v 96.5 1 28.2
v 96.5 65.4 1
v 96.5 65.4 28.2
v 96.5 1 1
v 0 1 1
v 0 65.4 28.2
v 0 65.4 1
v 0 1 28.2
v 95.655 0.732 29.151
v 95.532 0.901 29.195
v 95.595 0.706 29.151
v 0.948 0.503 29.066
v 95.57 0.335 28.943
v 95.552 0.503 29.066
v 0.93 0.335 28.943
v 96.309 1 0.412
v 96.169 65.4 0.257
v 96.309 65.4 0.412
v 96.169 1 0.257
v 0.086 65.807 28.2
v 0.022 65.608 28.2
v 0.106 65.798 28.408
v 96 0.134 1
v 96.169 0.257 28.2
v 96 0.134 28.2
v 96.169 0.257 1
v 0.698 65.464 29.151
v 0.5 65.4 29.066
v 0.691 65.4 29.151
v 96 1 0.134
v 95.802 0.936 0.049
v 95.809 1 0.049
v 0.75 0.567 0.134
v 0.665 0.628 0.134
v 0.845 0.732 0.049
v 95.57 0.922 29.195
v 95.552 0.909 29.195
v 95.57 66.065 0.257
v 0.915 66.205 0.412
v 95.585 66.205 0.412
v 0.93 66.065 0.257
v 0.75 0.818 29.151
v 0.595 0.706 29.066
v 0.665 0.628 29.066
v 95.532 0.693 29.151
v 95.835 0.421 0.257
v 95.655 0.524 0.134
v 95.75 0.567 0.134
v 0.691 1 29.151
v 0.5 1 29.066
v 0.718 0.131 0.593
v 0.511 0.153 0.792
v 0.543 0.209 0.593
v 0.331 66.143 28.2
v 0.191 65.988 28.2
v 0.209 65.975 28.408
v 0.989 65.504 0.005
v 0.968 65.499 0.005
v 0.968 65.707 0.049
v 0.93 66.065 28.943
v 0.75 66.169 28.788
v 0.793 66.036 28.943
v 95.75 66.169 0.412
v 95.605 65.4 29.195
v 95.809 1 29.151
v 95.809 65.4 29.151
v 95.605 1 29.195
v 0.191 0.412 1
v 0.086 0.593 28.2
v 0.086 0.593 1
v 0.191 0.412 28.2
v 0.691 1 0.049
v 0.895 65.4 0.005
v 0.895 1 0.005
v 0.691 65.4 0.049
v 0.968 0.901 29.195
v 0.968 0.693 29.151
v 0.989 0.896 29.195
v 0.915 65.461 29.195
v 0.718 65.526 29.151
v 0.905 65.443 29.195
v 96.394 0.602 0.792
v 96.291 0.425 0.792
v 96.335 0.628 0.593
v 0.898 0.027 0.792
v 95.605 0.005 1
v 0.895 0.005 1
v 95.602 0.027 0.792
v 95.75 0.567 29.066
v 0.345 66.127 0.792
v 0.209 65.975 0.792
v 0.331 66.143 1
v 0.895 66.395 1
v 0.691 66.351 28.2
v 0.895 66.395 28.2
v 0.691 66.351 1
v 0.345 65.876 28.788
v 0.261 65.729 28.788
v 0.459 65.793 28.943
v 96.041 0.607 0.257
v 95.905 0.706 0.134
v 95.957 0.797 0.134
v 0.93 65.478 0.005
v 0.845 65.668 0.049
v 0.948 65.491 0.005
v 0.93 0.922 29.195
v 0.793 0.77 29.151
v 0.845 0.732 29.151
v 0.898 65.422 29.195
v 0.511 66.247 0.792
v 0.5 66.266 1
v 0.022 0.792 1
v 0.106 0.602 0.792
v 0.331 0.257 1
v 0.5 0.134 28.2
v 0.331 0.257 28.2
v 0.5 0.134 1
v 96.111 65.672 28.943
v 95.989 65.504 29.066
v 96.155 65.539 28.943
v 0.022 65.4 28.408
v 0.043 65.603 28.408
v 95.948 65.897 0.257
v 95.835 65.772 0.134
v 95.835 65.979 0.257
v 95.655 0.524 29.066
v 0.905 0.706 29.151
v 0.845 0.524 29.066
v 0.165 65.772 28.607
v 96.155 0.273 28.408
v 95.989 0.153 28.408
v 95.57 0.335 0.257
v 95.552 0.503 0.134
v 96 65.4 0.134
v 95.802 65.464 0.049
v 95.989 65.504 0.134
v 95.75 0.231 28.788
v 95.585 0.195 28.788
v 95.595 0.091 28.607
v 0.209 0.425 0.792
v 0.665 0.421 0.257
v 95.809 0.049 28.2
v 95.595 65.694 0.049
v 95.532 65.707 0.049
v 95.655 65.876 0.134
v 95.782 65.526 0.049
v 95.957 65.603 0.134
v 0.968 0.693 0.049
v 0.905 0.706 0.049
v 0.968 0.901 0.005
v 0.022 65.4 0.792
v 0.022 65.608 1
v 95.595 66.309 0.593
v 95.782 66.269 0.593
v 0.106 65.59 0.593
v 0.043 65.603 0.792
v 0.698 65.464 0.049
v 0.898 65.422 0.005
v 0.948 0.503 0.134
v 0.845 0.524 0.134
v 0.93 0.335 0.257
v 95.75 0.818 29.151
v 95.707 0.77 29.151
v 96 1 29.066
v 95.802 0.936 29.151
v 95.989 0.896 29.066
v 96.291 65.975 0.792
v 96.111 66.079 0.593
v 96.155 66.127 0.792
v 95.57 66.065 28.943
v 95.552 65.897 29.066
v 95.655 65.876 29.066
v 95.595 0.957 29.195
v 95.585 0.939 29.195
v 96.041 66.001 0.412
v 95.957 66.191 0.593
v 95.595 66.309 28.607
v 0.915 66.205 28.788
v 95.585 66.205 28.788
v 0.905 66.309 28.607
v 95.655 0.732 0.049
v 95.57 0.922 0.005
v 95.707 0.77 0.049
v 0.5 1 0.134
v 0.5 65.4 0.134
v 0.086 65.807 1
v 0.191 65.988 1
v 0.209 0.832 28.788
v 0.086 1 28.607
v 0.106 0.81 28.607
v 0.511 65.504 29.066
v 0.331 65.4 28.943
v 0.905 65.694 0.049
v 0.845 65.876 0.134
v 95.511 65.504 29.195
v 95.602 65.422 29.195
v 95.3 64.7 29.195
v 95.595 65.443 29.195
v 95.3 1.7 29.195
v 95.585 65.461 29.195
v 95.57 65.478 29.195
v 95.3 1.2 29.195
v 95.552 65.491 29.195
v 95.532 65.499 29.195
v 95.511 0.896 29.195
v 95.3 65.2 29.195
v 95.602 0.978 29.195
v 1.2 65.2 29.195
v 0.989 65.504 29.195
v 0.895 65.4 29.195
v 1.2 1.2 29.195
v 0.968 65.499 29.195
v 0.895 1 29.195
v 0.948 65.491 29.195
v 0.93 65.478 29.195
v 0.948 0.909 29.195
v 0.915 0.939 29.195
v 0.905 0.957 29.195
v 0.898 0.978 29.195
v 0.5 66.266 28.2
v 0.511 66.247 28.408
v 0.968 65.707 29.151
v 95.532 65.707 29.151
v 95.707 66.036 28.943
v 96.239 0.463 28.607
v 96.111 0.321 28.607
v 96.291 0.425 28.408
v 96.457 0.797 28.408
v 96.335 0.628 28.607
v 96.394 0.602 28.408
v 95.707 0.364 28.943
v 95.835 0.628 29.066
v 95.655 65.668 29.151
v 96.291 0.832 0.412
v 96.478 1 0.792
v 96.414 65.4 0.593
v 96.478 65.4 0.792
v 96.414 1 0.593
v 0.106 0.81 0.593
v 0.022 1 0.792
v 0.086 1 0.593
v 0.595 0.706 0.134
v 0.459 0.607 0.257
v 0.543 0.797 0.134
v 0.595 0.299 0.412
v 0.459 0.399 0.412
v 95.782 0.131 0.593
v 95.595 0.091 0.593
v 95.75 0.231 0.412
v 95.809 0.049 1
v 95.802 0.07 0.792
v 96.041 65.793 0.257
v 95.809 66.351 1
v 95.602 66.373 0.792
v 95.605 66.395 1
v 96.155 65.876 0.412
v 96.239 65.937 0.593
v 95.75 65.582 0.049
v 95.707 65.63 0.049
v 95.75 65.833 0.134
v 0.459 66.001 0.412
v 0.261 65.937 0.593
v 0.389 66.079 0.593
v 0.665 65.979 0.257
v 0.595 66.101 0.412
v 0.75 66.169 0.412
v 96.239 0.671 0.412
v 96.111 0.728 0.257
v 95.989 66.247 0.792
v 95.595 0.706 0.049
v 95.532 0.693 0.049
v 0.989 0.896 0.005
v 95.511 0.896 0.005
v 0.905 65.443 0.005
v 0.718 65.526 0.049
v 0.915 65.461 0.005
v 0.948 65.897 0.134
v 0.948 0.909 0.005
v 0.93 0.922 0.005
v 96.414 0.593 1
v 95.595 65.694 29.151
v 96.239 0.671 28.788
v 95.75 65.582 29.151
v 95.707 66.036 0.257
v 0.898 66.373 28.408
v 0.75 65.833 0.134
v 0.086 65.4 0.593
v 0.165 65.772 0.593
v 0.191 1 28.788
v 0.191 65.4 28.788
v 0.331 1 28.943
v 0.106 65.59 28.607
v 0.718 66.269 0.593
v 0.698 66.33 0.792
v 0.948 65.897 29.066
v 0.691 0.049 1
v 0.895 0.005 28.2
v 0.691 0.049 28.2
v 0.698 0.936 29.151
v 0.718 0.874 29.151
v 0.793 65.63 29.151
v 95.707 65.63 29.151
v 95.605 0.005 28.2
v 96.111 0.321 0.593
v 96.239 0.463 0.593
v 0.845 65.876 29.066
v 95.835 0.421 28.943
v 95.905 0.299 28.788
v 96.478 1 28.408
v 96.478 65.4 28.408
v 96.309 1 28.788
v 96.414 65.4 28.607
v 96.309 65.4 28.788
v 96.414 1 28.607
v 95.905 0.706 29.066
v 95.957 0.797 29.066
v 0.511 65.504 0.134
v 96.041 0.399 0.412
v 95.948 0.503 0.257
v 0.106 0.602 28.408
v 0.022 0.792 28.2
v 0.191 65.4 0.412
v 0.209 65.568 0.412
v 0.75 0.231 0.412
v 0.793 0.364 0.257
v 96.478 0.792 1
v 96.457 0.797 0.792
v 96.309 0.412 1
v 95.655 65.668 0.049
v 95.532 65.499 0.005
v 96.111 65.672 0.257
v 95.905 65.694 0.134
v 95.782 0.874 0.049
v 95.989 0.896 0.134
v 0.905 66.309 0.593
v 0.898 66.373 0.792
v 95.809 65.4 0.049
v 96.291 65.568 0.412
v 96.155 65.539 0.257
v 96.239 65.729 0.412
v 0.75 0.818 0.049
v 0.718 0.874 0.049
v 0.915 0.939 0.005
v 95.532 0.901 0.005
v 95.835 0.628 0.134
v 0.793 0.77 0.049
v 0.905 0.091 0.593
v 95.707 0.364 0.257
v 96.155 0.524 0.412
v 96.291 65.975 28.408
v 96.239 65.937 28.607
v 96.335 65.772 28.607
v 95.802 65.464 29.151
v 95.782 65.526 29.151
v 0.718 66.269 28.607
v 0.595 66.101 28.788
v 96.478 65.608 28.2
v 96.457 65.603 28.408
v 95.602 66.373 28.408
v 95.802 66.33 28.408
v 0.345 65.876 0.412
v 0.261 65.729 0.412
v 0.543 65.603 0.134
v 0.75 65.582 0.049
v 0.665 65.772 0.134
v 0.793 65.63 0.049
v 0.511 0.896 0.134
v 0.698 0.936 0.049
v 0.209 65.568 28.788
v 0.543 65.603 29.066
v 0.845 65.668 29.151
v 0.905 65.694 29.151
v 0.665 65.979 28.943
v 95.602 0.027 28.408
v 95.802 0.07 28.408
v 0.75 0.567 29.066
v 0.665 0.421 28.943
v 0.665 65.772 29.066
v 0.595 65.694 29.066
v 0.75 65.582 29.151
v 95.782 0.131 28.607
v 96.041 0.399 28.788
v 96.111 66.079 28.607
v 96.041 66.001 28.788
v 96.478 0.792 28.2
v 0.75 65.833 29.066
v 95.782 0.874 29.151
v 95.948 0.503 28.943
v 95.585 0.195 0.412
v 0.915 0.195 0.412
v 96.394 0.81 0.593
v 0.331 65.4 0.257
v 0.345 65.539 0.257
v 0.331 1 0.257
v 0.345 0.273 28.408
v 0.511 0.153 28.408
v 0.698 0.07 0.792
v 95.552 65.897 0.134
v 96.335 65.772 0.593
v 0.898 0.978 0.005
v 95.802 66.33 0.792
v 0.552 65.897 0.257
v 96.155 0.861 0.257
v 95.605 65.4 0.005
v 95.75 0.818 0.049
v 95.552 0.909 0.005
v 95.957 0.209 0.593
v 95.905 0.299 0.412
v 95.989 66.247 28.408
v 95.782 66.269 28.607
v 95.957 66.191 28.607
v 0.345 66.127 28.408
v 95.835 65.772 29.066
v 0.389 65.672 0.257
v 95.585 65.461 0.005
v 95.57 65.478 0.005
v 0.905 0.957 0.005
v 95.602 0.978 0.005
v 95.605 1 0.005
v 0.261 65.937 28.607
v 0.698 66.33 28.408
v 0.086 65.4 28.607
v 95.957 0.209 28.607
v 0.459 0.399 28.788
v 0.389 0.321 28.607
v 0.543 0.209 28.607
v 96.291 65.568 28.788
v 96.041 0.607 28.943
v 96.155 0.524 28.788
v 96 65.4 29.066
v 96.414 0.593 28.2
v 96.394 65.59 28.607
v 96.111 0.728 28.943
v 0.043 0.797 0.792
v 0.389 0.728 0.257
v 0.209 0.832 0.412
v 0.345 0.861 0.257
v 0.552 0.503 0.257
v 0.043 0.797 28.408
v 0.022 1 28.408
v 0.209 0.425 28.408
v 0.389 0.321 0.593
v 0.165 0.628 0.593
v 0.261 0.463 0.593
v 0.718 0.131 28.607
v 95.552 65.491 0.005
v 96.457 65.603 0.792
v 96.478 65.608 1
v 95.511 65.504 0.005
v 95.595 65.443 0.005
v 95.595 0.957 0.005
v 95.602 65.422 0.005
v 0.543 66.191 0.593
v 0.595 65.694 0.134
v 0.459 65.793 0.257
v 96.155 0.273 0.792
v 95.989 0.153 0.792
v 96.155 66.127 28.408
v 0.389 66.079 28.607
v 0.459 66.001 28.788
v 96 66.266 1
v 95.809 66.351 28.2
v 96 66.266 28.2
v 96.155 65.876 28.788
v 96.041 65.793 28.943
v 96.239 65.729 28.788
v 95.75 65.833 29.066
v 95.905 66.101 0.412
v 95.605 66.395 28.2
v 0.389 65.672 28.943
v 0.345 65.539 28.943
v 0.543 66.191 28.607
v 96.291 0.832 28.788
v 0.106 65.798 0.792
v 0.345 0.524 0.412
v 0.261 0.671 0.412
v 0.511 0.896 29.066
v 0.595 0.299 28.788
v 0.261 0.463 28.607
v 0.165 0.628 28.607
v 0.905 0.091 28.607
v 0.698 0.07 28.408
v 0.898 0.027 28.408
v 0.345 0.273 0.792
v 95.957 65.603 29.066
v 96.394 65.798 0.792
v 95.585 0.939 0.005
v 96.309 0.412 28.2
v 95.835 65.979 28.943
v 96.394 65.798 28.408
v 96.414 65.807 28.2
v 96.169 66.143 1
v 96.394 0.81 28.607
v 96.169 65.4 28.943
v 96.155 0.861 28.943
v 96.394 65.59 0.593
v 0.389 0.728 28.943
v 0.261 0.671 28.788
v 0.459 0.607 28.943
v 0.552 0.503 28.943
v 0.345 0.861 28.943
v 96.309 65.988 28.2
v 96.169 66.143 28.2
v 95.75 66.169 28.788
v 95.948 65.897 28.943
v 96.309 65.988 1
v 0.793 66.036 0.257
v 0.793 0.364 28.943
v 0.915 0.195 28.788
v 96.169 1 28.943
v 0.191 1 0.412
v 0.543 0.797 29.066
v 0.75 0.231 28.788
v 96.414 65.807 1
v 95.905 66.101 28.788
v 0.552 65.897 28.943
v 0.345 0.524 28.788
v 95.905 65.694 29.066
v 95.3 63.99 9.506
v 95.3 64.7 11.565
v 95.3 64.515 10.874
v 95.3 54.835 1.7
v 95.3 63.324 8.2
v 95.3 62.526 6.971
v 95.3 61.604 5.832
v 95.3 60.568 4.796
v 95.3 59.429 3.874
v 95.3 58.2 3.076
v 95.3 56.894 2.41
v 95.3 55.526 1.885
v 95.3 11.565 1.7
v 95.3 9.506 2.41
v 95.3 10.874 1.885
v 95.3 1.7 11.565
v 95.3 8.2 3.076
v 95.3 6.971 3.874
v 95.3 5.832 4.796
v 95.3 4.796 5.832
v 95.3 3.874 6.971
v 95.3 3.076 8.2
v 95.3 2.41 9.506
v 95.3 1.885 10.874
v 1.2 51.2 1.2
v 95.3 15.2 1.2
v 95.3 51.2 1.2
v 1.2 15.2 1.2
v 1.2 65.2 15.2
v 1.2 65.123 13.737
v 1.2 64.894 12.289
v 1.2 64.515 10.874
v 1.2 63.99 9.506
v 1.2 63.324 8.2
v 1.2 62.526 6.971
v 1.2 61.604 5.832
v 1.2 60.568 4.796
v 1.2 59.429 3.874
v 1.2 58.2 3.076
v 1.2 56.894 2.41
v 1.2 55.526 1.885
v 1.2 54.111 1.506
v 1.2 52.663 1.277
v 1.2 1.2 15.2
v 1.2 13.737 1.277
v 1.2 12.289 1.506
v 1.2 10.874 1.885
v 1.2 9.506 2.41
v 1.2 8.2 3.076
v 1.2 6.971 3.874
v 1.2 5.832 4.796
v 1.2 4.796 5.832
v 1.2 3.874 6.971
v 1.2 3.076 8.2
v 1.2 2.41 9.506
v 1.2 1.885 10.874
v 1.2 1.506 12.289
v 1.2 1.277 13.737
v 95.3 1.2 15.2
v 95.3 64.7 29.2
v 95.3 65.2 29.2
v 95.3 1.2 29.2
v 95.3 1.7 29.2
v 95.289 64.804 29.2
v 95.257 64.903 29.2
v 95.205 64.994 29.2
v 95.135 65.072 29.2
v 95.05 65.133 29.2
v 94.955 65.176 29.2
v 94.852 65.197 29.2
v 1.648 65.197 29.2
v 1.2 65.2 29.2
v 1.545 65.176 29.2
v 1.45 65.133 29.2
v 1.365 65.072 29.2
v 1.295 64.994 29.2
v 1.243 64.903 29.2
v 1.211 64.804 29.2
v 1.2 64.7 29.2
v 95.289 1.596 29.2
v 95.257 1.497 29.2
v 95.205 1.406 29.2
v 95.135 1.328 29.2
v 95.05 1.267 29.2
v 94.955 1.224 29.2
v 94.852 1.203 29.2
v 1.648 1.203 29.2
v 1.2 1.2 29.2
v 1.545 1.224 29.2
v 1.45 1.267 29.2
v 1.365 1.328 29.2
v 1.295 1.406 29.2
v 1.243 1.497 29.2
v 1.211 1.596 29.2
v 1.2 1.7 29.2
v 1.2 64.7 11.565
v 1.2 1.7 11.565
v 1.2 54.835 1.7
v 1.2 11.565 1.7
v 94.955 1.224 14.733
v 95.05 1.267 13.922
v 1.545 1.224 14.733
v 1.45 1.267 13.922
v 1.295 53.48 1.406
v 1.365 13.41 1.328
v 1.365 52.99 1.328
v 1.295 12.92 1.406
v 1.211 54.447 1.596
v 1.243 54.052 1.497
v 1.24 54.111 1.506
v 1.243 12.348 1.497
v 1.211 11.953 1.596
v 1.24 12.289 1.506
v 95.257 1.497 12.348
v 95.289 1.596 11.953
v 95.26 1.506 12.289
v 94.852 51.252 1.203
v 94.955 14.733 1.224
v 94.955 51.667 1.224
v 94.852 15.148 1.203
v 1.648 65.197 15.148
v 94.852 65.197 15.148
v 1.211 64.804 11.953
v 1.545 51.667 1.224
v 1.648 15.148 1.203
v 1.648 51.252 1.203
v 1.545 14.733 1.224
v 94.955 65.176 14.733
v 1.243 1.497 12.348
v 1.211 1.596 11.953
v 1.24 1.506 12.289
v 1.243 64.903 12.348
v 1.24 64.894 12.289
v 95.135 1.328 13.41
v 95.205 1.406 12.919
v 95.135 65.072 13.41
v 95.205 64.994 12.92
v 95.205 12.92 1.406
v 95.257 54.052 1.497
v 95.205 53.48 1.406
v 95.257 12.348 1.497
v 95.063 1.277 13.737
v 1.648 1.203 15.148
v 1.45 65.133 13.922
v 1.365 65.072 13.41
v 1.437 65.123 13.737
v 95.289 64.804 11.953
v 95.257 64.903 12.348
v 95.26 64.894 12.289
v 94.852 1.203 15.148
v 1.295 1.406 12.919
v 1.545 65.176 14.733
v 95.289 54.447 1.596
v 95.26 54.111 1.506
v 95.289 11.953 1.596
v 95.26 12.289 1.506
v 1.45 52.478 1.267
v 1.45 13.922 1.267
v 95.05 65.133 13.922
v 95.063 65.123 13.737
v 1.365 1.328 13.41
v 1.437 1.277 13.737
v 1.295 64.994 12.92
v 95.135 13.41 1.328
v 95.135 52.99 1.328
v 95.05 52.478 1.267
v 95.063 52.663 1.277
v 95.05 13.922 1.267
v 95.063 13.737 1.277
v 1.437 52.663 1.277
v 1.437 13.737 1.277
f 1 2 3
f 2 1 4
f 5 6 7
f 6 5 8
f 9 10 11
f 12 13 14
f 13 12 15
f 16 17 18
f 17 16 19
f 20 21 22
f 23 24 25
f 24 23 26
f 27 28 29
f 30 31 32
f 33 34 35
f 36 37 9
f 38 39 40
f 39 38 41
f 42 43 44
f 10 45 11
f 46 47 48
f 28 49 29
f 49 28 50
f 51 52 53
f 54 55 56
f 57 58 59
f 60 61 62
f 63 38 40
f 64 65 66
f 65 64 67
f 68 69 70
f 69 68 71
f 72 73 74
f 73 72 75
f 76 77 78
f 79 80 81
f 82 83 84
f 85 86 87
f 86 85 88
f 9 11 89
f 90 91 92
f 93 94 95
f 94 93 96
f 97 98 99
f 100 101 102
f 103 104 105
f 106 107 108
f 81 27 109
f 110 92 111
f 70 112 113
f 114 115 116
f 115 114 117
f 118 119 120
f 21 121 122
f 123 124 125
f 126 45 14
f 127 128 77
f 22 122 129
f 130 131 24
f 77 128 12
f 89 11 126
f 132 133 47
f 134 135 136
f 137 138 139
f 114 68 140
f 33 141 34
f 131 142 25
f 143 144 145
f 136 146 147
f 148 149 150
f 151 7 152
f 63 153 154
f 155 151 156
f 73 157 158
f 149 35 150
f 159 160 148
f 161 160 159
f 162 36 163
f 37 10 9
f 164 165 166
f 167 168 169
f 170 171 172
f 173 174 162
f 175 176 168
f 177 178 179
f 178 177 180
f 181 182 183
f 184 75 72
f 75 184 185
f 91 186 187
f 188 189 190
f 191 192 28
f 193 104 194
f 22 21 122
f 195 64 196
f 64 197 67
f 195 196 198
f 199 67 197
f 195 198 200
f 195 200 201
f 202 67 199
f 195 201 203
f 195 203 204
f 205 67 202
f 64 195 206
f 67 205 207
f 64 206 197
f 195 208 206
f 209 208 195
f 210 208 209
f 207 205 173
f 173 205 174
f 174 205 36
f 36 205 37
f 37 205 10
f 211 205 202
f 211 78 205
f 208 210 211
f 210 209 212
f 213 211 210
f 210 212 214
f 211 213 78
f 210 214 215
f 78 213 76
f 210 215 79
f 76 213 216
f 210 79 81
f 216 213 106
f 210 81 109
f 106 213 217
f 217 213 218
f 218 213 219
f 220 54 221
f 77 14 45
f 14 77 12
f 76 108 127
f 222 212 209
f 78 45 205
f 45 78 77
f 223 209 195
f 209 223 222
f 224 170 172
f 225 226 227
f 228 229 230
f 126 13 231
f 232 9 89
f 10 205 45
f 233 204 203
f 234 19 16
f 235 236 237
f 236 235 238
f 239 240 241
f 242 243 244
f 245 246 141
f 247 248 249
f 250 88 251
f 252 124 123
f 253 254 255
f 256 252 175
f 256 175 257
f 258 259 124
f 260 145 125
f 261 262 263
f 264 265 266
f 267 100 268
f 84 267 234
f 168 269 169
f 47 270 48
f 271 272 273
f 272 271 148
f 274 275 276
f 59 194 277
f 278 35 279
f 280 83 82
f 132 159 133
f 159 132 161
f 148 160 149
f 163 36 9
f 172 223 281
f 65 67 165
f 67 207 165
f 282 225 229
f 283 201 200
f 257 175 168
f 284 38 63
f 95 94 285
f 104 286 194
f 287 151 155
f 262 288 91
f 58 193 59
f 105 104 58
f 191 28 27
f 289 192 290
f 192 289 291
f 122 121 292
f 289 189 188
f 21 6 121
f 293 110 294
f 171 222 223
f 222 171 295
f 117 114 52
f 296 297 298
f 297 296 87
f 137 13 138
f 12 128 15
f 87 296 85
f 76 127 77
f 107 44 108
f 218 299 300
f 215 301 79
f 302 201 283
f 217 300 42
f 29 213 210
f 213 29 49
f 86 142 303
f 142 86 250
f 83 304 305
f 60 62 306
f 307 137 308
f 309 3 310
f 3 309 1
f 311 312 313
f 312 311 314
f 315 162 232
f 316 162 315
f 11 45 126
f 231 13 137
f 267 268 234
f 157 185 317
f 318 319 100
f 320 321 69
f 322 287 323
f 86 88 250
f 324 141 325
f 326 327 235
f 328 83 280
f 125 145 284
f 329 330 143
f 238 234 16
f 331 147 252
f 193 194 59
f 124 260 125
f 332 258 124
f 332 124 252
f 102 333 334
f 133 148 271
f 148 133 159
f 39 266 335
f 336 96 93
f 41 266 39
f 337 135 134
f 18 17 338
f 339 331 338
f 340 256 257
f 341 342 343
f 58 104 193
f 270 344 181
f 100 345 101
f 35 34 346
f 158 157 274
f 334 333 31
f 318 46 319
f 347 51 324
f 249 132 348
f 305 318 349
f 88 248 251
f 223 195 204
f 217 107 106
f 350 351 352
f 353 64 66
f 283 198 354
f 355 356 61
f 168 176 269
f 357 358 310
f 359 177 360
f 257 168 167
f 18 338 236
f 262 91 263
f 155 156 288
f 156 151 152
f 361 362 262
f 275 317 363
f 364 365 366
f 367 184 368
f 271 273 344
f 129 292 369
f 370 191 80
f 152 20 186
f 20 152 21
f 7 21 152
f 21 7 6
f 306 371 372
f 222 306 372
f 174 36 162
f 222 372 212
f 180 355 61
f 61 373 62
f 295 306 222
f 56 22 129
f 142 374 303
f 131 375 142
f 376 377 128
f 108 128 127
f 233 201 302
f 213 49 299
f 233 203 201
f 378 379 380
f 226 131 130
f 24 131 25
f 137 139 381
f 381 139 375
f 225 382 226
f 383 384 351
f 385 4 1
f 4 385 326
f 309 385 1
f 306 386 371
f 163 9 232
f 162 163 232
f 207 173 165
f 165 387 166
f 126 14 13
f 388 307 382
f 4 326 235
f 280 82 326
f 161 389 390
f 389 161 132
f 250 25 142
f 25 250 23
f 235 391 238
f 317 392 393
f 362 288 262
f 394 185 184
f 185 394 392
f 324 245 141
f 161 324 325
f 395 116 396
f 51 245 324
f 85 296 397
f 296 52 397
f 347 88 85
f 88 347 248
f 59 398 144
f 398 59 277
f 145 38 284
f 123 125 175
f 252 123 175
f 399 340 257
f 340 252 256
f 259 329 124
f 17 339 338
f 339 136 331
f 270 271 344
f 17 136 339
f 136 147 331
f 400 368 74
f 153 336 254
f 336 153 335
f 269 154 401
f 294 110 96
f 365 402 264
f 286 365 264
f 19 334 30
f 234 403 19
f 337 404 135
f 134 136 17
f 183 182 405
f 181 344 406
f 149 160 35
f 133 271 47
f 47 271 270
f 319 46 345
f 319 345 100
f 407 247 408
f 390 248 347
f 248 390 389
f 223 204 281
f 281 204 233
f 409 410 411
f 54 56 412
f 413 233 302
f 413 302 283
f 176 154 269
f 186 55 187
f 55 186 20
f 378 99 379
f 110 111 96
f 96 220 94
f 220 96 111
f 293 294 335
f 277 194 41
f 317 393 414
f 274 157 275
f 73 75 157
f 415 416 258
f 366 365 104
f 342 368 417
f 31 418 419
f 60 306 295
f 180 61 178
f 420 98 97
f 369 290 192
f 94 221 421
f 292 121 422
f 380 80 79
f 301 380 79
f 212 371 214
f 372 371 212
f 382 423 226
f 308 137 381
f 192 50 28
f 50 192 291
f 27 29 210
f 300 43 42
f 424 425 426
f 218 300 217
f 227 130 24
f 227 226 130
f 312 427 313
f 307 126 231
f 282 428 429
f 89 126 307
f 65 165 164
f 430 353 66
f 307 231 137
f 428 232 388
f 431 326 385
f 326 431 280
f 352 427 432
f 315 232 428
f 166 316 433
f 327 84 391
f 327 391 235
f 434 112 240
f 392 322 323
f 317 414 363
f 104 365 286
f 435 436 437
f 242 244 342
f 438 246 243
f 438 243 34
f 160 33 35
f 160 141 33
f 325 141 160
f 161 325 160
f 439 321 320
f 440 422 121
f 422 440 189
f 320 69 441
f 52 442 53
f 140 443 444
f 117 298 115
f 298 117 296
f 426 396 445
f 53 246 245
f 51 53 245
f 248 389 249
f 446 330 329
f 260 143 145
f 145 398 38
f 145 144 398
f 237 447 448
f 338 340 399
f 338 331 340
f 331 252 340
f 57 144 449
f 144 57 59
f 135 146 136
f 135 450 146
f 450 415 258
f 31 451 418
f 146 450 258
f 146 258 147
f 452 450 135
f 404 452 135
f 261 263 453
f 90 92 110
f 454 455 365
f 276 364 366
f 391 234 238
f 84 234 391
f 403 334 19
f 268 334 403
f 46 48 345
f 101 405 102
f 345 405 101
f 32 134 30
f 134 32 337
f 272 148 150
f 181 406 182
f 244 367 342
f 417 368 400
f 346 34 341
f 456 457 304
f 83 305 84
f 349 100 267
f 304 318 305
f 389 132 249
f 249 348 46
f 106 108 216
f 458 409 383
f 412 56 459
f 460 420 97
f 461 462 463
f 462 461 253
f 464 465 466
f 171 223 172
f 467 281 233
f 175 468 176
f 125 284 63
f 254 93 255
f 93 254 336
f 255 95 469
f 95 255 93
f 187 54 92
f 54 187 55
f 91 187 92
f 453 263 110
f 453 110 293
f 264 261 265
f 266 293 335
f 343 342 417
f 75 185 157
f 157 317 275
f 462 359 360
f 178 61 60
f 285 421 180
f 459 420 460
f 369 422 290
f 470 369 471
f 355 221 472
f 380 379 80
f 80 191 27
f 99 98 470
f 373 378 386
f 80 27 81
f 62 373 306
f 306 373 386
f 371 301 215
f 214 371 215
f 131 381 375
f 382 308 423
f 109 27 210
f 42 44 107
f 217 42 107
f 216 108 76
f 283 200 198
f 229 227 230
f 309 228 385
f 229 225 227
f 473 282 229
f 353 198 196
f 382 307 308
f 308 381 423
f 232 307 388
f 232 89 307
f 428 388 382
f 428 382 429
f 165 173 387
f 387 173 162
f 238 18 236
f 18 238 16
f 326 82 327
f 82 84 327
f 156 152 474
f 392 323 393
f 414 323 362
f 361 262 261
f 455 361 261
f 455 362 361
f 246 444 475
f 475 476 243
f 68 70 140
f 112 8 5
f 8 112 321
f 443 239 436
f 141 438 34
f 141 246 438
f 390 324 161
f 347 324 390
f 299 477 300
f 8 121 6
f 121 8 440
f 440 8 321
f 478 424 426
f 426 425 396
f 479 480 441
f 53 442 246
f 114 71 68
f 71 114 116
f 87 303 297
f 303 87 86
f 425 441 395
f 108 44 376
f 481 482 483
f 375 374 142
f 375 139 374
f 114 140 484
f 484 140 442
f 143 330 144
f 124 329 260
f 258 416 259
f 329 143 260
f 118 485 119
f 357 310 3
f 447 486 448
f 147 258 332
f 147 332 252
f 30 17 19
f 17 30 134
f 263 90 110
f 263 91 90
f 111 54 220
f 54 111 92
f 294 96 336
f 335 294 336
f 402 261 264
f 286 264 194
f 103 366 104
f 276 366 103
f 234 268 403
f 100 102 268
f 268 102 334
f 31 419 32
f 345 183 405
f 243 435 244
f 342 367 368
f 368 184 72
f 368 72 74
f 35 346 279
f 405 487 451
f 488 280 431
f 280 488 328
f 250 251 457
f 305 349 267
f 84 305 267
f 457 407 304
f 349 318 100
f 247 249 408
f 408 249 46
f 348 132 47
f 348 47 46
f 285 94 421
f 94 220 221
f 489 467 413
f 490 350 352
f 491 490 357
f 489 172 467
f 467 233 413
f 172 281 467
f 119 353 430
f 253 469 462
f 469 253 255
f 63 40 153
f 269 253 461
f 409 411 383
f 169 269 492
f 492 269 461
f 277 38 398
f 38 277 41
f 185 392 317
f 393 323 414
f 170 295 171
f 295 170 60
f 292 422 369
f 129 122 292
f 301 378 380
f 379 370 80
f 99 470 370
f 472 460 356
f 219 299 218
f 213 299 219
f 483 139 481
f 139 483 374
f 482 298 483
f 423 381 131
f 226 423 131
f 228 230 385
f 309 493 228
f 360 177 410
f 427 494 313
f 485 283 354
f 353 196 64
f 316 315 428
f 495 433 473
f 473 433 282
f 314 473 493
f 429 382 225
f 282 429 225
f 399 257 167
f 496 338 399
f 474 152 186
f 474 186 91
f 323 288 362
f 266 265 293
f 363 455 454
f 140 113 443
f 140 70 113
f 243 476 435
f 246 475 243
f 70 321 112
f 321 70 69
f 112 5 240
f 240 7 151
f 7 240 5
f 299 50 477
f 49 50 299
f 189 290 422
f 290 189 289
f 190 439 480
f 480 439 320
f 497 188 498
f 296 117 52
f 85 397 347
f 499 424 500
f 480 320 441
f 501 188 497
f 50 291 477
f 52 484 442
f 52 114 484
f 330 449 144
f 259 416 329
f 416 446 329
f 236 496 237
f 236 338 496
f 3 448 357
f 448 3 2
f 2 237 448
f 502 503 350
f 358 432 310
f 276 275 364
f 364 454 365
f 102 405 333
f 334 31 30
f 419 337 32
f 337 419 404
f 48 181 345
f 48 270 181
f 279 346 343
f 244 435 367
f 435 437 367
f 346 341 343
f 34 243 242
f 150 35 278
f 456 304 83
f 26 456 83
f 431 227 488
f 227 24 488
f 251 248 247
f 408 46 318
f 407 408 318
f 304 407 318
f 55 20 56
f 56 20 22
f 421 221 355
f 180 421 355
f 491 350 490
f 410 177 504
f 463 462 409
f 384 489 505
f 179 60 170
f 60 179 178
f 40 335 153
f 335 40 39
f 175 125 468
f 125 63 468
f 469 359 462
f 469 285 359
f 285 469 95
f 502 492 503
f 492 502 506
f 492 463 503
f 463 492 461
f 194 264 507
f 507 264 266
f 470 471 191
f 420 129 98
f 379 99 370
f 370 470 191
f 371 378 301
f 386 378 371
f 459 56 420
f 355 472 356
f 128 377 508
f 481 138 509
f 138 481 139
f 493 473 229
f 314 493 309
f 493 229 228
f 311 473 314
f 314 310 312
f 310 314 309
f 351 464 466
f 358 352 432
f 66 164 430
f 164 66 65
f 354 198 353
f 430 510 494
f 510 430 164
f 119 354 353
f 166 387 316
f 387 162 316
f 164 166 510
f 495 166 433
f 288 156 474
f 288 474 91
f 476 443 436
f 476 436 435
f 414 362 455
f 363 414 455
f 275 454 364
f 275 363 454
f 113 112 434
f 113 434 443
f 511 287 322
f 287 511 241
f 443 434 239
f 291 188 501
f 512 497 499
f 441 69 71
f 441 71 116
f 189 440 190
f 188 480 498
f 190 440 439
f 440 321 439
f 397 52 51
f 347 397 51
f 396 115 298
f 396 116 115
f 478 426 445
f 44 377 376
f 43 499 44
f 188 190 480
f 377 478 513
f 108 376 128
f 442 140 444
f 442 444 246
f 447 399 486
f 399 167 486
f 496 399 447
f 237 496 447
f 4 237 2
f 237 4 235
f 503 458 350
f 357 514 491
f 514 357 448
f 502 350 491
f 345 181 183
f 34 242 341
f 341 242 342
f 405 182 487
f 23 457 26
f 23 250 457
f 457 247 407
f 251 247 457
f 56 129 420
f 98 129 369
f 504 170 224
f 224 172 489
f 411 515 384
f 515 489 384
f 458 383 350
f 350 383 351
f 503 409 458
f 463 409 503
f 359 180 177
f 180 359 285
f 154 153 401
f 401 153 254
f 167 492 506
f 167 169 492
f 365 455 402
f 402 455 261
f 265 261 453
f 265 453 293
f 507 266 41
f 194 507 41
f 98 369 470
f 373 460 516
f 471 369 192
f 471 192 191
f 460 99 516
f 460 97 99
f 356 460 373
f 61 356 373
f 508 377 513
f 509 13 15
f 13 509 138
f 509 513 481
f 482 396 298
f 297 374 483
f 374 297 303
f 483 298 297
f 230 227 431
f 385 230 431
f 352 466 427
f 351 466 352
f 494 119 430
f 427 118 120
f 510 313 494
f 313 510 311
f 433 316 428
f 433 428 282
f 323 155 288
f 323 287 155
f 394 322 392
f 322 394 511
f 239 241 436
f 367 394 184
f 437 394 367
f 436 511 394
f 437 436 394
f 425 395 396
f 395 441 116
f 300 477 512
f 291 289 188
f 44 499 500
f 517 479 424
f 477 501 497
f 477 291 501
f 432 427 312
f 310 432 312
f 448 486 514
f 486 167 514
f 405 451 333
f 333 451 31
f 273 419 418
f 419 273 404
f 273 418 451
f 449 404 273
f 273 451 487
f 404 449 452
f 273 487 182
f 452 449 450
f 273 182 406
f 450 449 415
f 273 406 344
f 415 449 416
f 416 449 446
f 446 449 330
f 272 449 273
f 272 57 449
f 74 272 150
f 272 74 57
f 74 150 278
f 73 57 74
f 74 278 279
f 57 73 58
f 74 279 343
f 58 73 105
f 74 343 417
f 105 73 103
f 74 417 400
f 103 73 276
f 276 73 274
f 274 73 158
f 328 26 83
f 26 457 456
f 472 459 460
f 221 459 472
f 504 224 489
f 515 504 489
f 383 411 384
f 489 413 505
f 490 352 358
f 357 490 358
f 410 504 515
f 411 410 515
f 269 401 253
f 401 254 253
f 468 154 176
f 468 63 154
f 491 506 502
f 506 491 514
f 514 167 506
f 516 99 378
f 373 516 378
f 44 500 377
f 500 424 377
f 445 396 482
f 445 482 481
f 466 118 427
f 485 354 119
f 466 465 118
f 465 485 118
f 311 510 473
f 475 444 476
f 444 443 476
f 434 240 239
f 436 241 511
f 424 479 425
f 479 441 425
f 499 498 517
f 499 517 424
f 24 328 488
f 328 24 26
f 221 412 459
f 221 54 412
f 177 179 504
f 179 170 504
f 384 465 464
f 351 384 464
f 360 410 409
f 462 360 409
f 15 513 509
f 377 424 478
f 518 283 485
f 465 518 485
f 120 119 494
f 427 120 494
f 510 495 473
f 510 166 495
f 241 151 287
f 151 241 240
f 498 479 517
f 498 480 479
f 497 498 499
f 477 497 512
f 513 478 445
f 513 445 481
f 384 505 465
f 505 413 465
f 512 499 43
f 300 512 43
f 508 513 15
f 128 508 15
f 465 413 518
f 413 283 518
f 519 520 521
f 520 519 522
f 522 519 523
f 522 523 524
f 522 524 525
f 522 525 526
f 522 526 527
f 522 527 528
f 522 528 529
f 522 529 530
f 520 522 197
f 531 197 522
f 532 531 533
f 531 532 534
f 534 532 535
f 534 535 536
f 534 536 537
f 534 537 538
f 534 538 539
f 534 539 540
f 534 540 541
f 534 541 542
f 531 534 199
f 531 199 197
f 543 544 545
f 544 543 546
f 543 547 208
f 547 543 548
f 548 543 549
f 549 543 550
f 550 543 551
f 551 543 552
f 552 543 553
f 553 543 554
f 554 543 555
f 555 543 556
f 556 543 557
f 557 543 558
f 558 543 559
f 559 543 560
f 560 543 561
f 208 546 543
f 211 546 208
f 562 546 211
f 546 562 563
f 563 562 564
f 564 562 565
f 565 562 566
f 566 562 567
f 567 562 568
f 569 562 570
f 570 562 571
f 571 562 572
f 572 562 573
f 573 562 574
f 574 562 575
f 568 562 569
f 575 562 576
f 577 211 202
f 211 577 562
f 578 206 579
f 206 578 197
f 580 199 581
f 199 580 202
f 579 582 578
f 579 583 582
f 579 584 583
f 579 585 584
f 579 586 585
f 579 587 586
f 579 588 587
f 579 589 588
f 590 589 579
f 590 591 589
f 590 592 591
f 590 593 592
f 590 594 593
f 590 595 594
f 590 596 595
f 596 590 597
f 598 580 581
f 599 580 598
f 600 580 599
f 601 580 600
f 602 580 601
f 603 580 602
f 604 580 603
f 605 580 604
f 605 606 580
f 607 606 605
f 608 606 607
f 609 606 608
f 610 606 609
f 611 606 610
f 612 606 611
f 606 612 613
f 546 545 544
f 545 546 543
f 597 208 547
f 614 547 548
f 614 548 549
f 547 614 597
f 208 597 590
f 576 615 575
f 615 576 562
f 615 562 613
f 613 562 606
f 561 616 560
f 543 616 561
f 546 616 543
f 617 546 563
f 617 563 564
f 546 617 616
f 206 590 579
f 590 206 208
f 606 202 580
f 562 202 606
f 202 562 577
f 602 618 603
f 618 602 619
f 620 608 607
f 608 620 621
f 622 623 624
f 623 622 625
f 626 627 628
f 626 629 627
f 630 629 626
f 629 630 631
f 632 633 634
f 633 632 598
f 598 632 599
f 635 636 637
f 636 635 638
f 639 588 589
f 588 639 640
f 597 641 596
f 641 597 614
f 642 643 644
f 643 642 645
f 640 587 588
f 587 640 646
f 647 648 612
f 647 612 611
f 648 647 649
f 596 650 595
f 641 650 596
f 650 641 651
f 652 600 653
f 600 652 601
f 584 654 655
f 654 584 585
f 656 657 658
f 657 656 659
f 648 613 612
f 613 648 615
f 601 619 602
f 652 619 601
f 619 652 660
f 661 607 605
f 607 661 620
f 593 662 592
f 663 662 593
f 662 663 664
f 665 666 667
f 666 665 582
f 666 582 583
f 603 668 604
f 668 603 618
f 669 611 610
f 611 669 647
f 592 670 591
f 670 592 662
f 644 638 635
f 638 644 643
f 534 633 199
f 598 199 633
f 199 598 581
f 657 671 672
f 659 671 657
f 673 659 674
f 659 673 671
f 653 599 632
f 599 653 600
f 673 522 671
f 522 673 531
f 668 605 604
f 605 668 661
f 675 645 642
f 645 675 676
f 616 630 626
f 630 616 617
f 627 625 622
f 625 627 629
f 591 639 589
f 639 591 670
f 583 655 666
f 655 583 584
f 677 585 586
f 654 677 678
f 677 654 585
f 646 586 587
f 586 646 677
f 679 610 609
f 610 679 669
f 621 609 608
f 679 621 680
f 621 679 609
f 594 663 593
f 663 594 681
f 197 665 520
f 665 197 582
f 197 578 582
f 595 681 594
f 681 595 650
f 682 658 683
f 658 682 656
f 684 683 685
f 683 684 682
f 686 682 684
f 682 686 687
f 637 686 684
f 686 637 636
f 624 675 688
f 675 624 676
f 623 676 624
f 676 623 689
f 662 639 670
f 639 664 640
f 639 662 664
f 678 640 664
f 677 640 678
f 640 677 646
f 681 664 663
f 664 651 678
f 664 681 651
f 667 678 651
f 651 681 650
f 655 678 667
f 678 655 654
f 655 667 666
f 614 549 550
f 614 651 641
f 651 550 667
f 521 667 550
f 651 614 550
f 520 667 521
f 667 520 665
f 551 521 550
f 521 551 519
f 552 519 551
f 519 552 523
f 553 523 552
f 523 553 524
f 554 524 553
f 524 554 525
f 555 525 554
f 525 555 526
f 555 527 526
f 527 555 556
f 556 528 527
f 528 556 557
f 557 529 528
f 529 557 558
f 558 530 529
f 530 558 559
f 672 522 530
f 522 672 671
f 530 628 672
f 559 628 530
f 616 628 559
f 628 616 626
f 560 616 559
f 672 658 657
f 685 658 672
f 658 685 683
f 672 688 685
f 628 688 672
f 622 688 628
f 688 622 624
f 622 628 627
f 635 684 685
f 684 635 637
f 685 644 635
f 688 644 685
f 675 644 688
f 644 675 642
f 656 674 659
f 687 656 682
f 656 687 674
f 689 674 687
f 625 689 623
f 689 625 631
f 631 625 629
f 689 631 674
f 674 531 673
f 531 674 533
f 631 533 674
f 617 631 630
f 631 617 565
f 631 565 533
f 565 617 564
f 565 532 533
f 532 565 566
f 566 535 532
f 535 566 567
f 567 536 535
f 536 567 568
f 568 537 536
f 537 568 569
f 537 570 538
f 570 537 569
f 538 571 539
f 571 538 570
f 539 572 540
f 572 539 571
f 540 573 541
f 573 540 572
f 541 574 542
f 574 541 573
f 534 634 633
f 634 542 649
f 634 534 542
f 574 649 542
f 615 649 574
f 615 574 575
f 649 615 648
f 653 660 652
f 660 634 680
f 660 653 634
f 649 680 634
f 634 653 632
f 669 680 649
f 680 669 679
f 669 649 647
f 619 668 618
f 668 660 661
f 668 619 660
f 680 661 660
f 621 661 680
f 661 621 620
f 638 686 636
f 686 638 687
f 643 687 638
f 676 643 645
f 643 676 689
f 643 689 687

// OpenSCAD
// Download both files into the same directory and make a copy of this template for each project. Adjust the variables and values as needed to override the defaults in this file as needed. In this way you can replace the `Ultimate_Box_Generator.scad` file with a new version without having to track and restore your changes.

// If you want to use any framework variables in calulations you must import them here. If you want to also change the variable you must use a second line below to do that.
//wall=wall;
//internal_wall=internal_wall;

// Include the framework. You can change the prefix to load from a shared path.
include    <Ultimate_Box_Generator.scad>;

// At this point you can start to adjust builtin varaibles and create your own. There are also some examples of more complex boxes at the end of the file.


// Parts to render. To do more complex opperations disable these and manually call make_box() and make_lid() instead.
show_box=false;	// Whether or not to render the box
show_lid=false;	// Whether or not to render the lid. To make open boxes with no lid set `show_lid=false` and `lid_type=5`.
lid_type=0; 

// General Settings
// comp_size_deep = 18; // Depth of compartments
// comp_size_x = 32;	 // Size of compartments, X
// comp_size_y = 24.6;	 // Size of compartments, Y
wall = 1.2;		    // Width of wall, see `internal_wall` below for alternate inner wall size.
internal_wall=0.8;
// repeat_x = 3;		// Number of compartments, X
// repeat_y = 2;		// Number of compartments, Y
//tolerance=.15;      // Tolerance around lid.  If it's too tight, increase this. If it's too loose, decrease it.

// Box Rounding
box_corner_radius=1; // Add a rounding affect to the corners of the box. Anything over `wall` will cause structure and lid problems.
internal_corner_radius=.5; // Add a rounding affect to the inside.
//mesh_corner_radius=0; // Leave a radius around each corner of the mesh. May hep with bridges.
//corner_fn=30;

// Supress individual walls.
//supress_walls_x=[]; // These are the walls running along the X axis. It should be an array of size [repeat_y-1][repeat_x].
//supress_walls_y=[]; // These are the walls running along the Y axis. It should be an array of size [repeat_x-1][repeat_y].
// Example for repeat_x=4, repeat_y=3:
//supress_walls_x=[[1,1]];
//supress_walls_y=[[1,0,1],[0,1,1],[1,1,1]];
//supress_sides=false; // [X, Y, X, Y] Cutout/supress some sides. this may behave baddly with compartments or mesh.
//supress_sides_radius=wall; // Add a rounding to the cutout.
//supress_sides_offset=0; // 0, wall, [X, Y, Z] adjsut the coutout in all directions. + to grow, - so shrink
//supress_sides_fn=30;

//Internal Structure (You may need to turn off `mesh_do_sides` or `mesh_do_bottom` for good results.)
// You can also use `make_wall()` to manually add your own walls.
// 1: Rounded bottom frame.
// 2: Hexagon bottom frame. (To make this shape perfect set `comp_size_deep` to the width between to edges of the tile and set `comp_size_x` or `comp_size_y` to this this: `comp_size_deep / sqrt(3)*2`.
// 3: Rough bottom to make bits sit unevenly. (Partial)
// 4: Vertical rounding on corner. Set `internal_size_deep` to `comp_size_deep` and `internal_size_circle` to the shortest `comp_size` for a circle.
// 5: Vertical hexegon. Results may varry.
internal_type=1; // Internal structure, see above.
//internal_rotate=false; // On lid axis or rotate to opposite.
internal_size_deep=comp_size_deep/2; // How far into the box to start the internal structure. Should be `comp_size_deep/2` for type 1-2, `wall` for 3, or comp_size_deep for type 4-5.
internal_size_circle=internal_type==1 ? internal_size_deep : internal_size_deep * 2 / sqrt(3); // Use this calculation, or the shorter comp_size for type 4-5.
//internal_fn=internal_type==1 || internal_type==4 ? 60 : 6; // Complexity of internal curves, may need to increase for larger or smoother curves.
//internal_wall=wall; // Custom size for internal walls.


// Complex Structure
//make_complex_box=false; // Use an array of objects from `complex_box` to create many smaller boxes within the larger box.
//internal_grow_down=true; // If set compartments will be extruded into the larger box from the top to make a flush surface. (May make a model that uses a lot of material.
//internal_empty_bottom=false; // If set the area blow each box will be empty. This will not be printable on a FDM printer unless supports are included internally but still may save material and print time.



// In addition you can set `show_box=false;` and then call `make_box()` manually to join and remove more structure to it like in this example.
/*show_box=false;
difference() {
    make_box();
    translate([0, comp_size_y/2 + wall, 0])
    rotate([0, 90, 0])
    cylinder(comp_size_x +wall*2, 10, 10);
}*/

// You can also use calls to `make_internal_box` to create more complex boxes within a larger box that share a single lid.
/*show_box=false;
make_box();
intersection() {     
    faction_x=10; faction_y=comp_size_y; faction_z=5; faction_repeat_x=3; faction_repeat_y=1;
    faction_size_x=calc_size(faction_repeat_x, faction_x, wall=internal_wall, internal_wall=internal_wall);
faction_size_y=calc_size(faction_repeat_y, faction_y, wall=internal_wall, internal_wall=internal_wall);
    
    translate([wall, wall, wall])
    cube([faction_size_x - wall, faction_size_y - wall*2, comp_size_deep]);
            
    translate([wall-internal_wall, wall-internal_wall, wall-internal_wall])
    union() {
        translate([0, 0, 0])
        make_internal_box(faction_x, faction_y, faction_z, wall=internal_wall, repeat_x=faction_repeat_x, repeat_y=faction_repeat_y);
    }
}*/

// This exmaple wil make a complex series of boxes in a larger container. The object's can be used to position other oebjects and create internal structure.
comp_size_x = 188.2/2; // external size add 2*wall to this
comp_size_y = 64;    // external width add 2*wall to this
comp_size_deep = 28; // external height add 2*wall to thist

// internal_wall=0.8;
// make the external box with no internal curves
//internal_size_deep=comp_size_deep  ;
make_box(internal_type=1);
// internal_type=1;
// internal_size_deep=comp_size_deep  ;
// comp2=make_object( x=32.2, y=31.6, z=20, offset_x=90, offset_y=0, repeat_x=3, repeat_y=2, color="Blue");

// complex_box=[
//    comp2   
// ];
// // make the internal compartments
// make_complex_box();

// Some notes on complex prints:
/* OpenSCAD experience is required to do pretty much any type of customization or complex opperations. This will essentialy just make the containers within one larger object with a single lid. Alternatly multiple boxes could be created and joined together with translations to make a larger object with multiple lids. 
   Due to how variables are passed in OpenSCAD it can be tricky to get the parameters set on the parent box and child boxes as you want. It is best to use global variable assignmets to set the child box parameters, then pass overrides to the `make_box()` call yourself. (You have to set `show_box=false;` if you do this.)
  */
